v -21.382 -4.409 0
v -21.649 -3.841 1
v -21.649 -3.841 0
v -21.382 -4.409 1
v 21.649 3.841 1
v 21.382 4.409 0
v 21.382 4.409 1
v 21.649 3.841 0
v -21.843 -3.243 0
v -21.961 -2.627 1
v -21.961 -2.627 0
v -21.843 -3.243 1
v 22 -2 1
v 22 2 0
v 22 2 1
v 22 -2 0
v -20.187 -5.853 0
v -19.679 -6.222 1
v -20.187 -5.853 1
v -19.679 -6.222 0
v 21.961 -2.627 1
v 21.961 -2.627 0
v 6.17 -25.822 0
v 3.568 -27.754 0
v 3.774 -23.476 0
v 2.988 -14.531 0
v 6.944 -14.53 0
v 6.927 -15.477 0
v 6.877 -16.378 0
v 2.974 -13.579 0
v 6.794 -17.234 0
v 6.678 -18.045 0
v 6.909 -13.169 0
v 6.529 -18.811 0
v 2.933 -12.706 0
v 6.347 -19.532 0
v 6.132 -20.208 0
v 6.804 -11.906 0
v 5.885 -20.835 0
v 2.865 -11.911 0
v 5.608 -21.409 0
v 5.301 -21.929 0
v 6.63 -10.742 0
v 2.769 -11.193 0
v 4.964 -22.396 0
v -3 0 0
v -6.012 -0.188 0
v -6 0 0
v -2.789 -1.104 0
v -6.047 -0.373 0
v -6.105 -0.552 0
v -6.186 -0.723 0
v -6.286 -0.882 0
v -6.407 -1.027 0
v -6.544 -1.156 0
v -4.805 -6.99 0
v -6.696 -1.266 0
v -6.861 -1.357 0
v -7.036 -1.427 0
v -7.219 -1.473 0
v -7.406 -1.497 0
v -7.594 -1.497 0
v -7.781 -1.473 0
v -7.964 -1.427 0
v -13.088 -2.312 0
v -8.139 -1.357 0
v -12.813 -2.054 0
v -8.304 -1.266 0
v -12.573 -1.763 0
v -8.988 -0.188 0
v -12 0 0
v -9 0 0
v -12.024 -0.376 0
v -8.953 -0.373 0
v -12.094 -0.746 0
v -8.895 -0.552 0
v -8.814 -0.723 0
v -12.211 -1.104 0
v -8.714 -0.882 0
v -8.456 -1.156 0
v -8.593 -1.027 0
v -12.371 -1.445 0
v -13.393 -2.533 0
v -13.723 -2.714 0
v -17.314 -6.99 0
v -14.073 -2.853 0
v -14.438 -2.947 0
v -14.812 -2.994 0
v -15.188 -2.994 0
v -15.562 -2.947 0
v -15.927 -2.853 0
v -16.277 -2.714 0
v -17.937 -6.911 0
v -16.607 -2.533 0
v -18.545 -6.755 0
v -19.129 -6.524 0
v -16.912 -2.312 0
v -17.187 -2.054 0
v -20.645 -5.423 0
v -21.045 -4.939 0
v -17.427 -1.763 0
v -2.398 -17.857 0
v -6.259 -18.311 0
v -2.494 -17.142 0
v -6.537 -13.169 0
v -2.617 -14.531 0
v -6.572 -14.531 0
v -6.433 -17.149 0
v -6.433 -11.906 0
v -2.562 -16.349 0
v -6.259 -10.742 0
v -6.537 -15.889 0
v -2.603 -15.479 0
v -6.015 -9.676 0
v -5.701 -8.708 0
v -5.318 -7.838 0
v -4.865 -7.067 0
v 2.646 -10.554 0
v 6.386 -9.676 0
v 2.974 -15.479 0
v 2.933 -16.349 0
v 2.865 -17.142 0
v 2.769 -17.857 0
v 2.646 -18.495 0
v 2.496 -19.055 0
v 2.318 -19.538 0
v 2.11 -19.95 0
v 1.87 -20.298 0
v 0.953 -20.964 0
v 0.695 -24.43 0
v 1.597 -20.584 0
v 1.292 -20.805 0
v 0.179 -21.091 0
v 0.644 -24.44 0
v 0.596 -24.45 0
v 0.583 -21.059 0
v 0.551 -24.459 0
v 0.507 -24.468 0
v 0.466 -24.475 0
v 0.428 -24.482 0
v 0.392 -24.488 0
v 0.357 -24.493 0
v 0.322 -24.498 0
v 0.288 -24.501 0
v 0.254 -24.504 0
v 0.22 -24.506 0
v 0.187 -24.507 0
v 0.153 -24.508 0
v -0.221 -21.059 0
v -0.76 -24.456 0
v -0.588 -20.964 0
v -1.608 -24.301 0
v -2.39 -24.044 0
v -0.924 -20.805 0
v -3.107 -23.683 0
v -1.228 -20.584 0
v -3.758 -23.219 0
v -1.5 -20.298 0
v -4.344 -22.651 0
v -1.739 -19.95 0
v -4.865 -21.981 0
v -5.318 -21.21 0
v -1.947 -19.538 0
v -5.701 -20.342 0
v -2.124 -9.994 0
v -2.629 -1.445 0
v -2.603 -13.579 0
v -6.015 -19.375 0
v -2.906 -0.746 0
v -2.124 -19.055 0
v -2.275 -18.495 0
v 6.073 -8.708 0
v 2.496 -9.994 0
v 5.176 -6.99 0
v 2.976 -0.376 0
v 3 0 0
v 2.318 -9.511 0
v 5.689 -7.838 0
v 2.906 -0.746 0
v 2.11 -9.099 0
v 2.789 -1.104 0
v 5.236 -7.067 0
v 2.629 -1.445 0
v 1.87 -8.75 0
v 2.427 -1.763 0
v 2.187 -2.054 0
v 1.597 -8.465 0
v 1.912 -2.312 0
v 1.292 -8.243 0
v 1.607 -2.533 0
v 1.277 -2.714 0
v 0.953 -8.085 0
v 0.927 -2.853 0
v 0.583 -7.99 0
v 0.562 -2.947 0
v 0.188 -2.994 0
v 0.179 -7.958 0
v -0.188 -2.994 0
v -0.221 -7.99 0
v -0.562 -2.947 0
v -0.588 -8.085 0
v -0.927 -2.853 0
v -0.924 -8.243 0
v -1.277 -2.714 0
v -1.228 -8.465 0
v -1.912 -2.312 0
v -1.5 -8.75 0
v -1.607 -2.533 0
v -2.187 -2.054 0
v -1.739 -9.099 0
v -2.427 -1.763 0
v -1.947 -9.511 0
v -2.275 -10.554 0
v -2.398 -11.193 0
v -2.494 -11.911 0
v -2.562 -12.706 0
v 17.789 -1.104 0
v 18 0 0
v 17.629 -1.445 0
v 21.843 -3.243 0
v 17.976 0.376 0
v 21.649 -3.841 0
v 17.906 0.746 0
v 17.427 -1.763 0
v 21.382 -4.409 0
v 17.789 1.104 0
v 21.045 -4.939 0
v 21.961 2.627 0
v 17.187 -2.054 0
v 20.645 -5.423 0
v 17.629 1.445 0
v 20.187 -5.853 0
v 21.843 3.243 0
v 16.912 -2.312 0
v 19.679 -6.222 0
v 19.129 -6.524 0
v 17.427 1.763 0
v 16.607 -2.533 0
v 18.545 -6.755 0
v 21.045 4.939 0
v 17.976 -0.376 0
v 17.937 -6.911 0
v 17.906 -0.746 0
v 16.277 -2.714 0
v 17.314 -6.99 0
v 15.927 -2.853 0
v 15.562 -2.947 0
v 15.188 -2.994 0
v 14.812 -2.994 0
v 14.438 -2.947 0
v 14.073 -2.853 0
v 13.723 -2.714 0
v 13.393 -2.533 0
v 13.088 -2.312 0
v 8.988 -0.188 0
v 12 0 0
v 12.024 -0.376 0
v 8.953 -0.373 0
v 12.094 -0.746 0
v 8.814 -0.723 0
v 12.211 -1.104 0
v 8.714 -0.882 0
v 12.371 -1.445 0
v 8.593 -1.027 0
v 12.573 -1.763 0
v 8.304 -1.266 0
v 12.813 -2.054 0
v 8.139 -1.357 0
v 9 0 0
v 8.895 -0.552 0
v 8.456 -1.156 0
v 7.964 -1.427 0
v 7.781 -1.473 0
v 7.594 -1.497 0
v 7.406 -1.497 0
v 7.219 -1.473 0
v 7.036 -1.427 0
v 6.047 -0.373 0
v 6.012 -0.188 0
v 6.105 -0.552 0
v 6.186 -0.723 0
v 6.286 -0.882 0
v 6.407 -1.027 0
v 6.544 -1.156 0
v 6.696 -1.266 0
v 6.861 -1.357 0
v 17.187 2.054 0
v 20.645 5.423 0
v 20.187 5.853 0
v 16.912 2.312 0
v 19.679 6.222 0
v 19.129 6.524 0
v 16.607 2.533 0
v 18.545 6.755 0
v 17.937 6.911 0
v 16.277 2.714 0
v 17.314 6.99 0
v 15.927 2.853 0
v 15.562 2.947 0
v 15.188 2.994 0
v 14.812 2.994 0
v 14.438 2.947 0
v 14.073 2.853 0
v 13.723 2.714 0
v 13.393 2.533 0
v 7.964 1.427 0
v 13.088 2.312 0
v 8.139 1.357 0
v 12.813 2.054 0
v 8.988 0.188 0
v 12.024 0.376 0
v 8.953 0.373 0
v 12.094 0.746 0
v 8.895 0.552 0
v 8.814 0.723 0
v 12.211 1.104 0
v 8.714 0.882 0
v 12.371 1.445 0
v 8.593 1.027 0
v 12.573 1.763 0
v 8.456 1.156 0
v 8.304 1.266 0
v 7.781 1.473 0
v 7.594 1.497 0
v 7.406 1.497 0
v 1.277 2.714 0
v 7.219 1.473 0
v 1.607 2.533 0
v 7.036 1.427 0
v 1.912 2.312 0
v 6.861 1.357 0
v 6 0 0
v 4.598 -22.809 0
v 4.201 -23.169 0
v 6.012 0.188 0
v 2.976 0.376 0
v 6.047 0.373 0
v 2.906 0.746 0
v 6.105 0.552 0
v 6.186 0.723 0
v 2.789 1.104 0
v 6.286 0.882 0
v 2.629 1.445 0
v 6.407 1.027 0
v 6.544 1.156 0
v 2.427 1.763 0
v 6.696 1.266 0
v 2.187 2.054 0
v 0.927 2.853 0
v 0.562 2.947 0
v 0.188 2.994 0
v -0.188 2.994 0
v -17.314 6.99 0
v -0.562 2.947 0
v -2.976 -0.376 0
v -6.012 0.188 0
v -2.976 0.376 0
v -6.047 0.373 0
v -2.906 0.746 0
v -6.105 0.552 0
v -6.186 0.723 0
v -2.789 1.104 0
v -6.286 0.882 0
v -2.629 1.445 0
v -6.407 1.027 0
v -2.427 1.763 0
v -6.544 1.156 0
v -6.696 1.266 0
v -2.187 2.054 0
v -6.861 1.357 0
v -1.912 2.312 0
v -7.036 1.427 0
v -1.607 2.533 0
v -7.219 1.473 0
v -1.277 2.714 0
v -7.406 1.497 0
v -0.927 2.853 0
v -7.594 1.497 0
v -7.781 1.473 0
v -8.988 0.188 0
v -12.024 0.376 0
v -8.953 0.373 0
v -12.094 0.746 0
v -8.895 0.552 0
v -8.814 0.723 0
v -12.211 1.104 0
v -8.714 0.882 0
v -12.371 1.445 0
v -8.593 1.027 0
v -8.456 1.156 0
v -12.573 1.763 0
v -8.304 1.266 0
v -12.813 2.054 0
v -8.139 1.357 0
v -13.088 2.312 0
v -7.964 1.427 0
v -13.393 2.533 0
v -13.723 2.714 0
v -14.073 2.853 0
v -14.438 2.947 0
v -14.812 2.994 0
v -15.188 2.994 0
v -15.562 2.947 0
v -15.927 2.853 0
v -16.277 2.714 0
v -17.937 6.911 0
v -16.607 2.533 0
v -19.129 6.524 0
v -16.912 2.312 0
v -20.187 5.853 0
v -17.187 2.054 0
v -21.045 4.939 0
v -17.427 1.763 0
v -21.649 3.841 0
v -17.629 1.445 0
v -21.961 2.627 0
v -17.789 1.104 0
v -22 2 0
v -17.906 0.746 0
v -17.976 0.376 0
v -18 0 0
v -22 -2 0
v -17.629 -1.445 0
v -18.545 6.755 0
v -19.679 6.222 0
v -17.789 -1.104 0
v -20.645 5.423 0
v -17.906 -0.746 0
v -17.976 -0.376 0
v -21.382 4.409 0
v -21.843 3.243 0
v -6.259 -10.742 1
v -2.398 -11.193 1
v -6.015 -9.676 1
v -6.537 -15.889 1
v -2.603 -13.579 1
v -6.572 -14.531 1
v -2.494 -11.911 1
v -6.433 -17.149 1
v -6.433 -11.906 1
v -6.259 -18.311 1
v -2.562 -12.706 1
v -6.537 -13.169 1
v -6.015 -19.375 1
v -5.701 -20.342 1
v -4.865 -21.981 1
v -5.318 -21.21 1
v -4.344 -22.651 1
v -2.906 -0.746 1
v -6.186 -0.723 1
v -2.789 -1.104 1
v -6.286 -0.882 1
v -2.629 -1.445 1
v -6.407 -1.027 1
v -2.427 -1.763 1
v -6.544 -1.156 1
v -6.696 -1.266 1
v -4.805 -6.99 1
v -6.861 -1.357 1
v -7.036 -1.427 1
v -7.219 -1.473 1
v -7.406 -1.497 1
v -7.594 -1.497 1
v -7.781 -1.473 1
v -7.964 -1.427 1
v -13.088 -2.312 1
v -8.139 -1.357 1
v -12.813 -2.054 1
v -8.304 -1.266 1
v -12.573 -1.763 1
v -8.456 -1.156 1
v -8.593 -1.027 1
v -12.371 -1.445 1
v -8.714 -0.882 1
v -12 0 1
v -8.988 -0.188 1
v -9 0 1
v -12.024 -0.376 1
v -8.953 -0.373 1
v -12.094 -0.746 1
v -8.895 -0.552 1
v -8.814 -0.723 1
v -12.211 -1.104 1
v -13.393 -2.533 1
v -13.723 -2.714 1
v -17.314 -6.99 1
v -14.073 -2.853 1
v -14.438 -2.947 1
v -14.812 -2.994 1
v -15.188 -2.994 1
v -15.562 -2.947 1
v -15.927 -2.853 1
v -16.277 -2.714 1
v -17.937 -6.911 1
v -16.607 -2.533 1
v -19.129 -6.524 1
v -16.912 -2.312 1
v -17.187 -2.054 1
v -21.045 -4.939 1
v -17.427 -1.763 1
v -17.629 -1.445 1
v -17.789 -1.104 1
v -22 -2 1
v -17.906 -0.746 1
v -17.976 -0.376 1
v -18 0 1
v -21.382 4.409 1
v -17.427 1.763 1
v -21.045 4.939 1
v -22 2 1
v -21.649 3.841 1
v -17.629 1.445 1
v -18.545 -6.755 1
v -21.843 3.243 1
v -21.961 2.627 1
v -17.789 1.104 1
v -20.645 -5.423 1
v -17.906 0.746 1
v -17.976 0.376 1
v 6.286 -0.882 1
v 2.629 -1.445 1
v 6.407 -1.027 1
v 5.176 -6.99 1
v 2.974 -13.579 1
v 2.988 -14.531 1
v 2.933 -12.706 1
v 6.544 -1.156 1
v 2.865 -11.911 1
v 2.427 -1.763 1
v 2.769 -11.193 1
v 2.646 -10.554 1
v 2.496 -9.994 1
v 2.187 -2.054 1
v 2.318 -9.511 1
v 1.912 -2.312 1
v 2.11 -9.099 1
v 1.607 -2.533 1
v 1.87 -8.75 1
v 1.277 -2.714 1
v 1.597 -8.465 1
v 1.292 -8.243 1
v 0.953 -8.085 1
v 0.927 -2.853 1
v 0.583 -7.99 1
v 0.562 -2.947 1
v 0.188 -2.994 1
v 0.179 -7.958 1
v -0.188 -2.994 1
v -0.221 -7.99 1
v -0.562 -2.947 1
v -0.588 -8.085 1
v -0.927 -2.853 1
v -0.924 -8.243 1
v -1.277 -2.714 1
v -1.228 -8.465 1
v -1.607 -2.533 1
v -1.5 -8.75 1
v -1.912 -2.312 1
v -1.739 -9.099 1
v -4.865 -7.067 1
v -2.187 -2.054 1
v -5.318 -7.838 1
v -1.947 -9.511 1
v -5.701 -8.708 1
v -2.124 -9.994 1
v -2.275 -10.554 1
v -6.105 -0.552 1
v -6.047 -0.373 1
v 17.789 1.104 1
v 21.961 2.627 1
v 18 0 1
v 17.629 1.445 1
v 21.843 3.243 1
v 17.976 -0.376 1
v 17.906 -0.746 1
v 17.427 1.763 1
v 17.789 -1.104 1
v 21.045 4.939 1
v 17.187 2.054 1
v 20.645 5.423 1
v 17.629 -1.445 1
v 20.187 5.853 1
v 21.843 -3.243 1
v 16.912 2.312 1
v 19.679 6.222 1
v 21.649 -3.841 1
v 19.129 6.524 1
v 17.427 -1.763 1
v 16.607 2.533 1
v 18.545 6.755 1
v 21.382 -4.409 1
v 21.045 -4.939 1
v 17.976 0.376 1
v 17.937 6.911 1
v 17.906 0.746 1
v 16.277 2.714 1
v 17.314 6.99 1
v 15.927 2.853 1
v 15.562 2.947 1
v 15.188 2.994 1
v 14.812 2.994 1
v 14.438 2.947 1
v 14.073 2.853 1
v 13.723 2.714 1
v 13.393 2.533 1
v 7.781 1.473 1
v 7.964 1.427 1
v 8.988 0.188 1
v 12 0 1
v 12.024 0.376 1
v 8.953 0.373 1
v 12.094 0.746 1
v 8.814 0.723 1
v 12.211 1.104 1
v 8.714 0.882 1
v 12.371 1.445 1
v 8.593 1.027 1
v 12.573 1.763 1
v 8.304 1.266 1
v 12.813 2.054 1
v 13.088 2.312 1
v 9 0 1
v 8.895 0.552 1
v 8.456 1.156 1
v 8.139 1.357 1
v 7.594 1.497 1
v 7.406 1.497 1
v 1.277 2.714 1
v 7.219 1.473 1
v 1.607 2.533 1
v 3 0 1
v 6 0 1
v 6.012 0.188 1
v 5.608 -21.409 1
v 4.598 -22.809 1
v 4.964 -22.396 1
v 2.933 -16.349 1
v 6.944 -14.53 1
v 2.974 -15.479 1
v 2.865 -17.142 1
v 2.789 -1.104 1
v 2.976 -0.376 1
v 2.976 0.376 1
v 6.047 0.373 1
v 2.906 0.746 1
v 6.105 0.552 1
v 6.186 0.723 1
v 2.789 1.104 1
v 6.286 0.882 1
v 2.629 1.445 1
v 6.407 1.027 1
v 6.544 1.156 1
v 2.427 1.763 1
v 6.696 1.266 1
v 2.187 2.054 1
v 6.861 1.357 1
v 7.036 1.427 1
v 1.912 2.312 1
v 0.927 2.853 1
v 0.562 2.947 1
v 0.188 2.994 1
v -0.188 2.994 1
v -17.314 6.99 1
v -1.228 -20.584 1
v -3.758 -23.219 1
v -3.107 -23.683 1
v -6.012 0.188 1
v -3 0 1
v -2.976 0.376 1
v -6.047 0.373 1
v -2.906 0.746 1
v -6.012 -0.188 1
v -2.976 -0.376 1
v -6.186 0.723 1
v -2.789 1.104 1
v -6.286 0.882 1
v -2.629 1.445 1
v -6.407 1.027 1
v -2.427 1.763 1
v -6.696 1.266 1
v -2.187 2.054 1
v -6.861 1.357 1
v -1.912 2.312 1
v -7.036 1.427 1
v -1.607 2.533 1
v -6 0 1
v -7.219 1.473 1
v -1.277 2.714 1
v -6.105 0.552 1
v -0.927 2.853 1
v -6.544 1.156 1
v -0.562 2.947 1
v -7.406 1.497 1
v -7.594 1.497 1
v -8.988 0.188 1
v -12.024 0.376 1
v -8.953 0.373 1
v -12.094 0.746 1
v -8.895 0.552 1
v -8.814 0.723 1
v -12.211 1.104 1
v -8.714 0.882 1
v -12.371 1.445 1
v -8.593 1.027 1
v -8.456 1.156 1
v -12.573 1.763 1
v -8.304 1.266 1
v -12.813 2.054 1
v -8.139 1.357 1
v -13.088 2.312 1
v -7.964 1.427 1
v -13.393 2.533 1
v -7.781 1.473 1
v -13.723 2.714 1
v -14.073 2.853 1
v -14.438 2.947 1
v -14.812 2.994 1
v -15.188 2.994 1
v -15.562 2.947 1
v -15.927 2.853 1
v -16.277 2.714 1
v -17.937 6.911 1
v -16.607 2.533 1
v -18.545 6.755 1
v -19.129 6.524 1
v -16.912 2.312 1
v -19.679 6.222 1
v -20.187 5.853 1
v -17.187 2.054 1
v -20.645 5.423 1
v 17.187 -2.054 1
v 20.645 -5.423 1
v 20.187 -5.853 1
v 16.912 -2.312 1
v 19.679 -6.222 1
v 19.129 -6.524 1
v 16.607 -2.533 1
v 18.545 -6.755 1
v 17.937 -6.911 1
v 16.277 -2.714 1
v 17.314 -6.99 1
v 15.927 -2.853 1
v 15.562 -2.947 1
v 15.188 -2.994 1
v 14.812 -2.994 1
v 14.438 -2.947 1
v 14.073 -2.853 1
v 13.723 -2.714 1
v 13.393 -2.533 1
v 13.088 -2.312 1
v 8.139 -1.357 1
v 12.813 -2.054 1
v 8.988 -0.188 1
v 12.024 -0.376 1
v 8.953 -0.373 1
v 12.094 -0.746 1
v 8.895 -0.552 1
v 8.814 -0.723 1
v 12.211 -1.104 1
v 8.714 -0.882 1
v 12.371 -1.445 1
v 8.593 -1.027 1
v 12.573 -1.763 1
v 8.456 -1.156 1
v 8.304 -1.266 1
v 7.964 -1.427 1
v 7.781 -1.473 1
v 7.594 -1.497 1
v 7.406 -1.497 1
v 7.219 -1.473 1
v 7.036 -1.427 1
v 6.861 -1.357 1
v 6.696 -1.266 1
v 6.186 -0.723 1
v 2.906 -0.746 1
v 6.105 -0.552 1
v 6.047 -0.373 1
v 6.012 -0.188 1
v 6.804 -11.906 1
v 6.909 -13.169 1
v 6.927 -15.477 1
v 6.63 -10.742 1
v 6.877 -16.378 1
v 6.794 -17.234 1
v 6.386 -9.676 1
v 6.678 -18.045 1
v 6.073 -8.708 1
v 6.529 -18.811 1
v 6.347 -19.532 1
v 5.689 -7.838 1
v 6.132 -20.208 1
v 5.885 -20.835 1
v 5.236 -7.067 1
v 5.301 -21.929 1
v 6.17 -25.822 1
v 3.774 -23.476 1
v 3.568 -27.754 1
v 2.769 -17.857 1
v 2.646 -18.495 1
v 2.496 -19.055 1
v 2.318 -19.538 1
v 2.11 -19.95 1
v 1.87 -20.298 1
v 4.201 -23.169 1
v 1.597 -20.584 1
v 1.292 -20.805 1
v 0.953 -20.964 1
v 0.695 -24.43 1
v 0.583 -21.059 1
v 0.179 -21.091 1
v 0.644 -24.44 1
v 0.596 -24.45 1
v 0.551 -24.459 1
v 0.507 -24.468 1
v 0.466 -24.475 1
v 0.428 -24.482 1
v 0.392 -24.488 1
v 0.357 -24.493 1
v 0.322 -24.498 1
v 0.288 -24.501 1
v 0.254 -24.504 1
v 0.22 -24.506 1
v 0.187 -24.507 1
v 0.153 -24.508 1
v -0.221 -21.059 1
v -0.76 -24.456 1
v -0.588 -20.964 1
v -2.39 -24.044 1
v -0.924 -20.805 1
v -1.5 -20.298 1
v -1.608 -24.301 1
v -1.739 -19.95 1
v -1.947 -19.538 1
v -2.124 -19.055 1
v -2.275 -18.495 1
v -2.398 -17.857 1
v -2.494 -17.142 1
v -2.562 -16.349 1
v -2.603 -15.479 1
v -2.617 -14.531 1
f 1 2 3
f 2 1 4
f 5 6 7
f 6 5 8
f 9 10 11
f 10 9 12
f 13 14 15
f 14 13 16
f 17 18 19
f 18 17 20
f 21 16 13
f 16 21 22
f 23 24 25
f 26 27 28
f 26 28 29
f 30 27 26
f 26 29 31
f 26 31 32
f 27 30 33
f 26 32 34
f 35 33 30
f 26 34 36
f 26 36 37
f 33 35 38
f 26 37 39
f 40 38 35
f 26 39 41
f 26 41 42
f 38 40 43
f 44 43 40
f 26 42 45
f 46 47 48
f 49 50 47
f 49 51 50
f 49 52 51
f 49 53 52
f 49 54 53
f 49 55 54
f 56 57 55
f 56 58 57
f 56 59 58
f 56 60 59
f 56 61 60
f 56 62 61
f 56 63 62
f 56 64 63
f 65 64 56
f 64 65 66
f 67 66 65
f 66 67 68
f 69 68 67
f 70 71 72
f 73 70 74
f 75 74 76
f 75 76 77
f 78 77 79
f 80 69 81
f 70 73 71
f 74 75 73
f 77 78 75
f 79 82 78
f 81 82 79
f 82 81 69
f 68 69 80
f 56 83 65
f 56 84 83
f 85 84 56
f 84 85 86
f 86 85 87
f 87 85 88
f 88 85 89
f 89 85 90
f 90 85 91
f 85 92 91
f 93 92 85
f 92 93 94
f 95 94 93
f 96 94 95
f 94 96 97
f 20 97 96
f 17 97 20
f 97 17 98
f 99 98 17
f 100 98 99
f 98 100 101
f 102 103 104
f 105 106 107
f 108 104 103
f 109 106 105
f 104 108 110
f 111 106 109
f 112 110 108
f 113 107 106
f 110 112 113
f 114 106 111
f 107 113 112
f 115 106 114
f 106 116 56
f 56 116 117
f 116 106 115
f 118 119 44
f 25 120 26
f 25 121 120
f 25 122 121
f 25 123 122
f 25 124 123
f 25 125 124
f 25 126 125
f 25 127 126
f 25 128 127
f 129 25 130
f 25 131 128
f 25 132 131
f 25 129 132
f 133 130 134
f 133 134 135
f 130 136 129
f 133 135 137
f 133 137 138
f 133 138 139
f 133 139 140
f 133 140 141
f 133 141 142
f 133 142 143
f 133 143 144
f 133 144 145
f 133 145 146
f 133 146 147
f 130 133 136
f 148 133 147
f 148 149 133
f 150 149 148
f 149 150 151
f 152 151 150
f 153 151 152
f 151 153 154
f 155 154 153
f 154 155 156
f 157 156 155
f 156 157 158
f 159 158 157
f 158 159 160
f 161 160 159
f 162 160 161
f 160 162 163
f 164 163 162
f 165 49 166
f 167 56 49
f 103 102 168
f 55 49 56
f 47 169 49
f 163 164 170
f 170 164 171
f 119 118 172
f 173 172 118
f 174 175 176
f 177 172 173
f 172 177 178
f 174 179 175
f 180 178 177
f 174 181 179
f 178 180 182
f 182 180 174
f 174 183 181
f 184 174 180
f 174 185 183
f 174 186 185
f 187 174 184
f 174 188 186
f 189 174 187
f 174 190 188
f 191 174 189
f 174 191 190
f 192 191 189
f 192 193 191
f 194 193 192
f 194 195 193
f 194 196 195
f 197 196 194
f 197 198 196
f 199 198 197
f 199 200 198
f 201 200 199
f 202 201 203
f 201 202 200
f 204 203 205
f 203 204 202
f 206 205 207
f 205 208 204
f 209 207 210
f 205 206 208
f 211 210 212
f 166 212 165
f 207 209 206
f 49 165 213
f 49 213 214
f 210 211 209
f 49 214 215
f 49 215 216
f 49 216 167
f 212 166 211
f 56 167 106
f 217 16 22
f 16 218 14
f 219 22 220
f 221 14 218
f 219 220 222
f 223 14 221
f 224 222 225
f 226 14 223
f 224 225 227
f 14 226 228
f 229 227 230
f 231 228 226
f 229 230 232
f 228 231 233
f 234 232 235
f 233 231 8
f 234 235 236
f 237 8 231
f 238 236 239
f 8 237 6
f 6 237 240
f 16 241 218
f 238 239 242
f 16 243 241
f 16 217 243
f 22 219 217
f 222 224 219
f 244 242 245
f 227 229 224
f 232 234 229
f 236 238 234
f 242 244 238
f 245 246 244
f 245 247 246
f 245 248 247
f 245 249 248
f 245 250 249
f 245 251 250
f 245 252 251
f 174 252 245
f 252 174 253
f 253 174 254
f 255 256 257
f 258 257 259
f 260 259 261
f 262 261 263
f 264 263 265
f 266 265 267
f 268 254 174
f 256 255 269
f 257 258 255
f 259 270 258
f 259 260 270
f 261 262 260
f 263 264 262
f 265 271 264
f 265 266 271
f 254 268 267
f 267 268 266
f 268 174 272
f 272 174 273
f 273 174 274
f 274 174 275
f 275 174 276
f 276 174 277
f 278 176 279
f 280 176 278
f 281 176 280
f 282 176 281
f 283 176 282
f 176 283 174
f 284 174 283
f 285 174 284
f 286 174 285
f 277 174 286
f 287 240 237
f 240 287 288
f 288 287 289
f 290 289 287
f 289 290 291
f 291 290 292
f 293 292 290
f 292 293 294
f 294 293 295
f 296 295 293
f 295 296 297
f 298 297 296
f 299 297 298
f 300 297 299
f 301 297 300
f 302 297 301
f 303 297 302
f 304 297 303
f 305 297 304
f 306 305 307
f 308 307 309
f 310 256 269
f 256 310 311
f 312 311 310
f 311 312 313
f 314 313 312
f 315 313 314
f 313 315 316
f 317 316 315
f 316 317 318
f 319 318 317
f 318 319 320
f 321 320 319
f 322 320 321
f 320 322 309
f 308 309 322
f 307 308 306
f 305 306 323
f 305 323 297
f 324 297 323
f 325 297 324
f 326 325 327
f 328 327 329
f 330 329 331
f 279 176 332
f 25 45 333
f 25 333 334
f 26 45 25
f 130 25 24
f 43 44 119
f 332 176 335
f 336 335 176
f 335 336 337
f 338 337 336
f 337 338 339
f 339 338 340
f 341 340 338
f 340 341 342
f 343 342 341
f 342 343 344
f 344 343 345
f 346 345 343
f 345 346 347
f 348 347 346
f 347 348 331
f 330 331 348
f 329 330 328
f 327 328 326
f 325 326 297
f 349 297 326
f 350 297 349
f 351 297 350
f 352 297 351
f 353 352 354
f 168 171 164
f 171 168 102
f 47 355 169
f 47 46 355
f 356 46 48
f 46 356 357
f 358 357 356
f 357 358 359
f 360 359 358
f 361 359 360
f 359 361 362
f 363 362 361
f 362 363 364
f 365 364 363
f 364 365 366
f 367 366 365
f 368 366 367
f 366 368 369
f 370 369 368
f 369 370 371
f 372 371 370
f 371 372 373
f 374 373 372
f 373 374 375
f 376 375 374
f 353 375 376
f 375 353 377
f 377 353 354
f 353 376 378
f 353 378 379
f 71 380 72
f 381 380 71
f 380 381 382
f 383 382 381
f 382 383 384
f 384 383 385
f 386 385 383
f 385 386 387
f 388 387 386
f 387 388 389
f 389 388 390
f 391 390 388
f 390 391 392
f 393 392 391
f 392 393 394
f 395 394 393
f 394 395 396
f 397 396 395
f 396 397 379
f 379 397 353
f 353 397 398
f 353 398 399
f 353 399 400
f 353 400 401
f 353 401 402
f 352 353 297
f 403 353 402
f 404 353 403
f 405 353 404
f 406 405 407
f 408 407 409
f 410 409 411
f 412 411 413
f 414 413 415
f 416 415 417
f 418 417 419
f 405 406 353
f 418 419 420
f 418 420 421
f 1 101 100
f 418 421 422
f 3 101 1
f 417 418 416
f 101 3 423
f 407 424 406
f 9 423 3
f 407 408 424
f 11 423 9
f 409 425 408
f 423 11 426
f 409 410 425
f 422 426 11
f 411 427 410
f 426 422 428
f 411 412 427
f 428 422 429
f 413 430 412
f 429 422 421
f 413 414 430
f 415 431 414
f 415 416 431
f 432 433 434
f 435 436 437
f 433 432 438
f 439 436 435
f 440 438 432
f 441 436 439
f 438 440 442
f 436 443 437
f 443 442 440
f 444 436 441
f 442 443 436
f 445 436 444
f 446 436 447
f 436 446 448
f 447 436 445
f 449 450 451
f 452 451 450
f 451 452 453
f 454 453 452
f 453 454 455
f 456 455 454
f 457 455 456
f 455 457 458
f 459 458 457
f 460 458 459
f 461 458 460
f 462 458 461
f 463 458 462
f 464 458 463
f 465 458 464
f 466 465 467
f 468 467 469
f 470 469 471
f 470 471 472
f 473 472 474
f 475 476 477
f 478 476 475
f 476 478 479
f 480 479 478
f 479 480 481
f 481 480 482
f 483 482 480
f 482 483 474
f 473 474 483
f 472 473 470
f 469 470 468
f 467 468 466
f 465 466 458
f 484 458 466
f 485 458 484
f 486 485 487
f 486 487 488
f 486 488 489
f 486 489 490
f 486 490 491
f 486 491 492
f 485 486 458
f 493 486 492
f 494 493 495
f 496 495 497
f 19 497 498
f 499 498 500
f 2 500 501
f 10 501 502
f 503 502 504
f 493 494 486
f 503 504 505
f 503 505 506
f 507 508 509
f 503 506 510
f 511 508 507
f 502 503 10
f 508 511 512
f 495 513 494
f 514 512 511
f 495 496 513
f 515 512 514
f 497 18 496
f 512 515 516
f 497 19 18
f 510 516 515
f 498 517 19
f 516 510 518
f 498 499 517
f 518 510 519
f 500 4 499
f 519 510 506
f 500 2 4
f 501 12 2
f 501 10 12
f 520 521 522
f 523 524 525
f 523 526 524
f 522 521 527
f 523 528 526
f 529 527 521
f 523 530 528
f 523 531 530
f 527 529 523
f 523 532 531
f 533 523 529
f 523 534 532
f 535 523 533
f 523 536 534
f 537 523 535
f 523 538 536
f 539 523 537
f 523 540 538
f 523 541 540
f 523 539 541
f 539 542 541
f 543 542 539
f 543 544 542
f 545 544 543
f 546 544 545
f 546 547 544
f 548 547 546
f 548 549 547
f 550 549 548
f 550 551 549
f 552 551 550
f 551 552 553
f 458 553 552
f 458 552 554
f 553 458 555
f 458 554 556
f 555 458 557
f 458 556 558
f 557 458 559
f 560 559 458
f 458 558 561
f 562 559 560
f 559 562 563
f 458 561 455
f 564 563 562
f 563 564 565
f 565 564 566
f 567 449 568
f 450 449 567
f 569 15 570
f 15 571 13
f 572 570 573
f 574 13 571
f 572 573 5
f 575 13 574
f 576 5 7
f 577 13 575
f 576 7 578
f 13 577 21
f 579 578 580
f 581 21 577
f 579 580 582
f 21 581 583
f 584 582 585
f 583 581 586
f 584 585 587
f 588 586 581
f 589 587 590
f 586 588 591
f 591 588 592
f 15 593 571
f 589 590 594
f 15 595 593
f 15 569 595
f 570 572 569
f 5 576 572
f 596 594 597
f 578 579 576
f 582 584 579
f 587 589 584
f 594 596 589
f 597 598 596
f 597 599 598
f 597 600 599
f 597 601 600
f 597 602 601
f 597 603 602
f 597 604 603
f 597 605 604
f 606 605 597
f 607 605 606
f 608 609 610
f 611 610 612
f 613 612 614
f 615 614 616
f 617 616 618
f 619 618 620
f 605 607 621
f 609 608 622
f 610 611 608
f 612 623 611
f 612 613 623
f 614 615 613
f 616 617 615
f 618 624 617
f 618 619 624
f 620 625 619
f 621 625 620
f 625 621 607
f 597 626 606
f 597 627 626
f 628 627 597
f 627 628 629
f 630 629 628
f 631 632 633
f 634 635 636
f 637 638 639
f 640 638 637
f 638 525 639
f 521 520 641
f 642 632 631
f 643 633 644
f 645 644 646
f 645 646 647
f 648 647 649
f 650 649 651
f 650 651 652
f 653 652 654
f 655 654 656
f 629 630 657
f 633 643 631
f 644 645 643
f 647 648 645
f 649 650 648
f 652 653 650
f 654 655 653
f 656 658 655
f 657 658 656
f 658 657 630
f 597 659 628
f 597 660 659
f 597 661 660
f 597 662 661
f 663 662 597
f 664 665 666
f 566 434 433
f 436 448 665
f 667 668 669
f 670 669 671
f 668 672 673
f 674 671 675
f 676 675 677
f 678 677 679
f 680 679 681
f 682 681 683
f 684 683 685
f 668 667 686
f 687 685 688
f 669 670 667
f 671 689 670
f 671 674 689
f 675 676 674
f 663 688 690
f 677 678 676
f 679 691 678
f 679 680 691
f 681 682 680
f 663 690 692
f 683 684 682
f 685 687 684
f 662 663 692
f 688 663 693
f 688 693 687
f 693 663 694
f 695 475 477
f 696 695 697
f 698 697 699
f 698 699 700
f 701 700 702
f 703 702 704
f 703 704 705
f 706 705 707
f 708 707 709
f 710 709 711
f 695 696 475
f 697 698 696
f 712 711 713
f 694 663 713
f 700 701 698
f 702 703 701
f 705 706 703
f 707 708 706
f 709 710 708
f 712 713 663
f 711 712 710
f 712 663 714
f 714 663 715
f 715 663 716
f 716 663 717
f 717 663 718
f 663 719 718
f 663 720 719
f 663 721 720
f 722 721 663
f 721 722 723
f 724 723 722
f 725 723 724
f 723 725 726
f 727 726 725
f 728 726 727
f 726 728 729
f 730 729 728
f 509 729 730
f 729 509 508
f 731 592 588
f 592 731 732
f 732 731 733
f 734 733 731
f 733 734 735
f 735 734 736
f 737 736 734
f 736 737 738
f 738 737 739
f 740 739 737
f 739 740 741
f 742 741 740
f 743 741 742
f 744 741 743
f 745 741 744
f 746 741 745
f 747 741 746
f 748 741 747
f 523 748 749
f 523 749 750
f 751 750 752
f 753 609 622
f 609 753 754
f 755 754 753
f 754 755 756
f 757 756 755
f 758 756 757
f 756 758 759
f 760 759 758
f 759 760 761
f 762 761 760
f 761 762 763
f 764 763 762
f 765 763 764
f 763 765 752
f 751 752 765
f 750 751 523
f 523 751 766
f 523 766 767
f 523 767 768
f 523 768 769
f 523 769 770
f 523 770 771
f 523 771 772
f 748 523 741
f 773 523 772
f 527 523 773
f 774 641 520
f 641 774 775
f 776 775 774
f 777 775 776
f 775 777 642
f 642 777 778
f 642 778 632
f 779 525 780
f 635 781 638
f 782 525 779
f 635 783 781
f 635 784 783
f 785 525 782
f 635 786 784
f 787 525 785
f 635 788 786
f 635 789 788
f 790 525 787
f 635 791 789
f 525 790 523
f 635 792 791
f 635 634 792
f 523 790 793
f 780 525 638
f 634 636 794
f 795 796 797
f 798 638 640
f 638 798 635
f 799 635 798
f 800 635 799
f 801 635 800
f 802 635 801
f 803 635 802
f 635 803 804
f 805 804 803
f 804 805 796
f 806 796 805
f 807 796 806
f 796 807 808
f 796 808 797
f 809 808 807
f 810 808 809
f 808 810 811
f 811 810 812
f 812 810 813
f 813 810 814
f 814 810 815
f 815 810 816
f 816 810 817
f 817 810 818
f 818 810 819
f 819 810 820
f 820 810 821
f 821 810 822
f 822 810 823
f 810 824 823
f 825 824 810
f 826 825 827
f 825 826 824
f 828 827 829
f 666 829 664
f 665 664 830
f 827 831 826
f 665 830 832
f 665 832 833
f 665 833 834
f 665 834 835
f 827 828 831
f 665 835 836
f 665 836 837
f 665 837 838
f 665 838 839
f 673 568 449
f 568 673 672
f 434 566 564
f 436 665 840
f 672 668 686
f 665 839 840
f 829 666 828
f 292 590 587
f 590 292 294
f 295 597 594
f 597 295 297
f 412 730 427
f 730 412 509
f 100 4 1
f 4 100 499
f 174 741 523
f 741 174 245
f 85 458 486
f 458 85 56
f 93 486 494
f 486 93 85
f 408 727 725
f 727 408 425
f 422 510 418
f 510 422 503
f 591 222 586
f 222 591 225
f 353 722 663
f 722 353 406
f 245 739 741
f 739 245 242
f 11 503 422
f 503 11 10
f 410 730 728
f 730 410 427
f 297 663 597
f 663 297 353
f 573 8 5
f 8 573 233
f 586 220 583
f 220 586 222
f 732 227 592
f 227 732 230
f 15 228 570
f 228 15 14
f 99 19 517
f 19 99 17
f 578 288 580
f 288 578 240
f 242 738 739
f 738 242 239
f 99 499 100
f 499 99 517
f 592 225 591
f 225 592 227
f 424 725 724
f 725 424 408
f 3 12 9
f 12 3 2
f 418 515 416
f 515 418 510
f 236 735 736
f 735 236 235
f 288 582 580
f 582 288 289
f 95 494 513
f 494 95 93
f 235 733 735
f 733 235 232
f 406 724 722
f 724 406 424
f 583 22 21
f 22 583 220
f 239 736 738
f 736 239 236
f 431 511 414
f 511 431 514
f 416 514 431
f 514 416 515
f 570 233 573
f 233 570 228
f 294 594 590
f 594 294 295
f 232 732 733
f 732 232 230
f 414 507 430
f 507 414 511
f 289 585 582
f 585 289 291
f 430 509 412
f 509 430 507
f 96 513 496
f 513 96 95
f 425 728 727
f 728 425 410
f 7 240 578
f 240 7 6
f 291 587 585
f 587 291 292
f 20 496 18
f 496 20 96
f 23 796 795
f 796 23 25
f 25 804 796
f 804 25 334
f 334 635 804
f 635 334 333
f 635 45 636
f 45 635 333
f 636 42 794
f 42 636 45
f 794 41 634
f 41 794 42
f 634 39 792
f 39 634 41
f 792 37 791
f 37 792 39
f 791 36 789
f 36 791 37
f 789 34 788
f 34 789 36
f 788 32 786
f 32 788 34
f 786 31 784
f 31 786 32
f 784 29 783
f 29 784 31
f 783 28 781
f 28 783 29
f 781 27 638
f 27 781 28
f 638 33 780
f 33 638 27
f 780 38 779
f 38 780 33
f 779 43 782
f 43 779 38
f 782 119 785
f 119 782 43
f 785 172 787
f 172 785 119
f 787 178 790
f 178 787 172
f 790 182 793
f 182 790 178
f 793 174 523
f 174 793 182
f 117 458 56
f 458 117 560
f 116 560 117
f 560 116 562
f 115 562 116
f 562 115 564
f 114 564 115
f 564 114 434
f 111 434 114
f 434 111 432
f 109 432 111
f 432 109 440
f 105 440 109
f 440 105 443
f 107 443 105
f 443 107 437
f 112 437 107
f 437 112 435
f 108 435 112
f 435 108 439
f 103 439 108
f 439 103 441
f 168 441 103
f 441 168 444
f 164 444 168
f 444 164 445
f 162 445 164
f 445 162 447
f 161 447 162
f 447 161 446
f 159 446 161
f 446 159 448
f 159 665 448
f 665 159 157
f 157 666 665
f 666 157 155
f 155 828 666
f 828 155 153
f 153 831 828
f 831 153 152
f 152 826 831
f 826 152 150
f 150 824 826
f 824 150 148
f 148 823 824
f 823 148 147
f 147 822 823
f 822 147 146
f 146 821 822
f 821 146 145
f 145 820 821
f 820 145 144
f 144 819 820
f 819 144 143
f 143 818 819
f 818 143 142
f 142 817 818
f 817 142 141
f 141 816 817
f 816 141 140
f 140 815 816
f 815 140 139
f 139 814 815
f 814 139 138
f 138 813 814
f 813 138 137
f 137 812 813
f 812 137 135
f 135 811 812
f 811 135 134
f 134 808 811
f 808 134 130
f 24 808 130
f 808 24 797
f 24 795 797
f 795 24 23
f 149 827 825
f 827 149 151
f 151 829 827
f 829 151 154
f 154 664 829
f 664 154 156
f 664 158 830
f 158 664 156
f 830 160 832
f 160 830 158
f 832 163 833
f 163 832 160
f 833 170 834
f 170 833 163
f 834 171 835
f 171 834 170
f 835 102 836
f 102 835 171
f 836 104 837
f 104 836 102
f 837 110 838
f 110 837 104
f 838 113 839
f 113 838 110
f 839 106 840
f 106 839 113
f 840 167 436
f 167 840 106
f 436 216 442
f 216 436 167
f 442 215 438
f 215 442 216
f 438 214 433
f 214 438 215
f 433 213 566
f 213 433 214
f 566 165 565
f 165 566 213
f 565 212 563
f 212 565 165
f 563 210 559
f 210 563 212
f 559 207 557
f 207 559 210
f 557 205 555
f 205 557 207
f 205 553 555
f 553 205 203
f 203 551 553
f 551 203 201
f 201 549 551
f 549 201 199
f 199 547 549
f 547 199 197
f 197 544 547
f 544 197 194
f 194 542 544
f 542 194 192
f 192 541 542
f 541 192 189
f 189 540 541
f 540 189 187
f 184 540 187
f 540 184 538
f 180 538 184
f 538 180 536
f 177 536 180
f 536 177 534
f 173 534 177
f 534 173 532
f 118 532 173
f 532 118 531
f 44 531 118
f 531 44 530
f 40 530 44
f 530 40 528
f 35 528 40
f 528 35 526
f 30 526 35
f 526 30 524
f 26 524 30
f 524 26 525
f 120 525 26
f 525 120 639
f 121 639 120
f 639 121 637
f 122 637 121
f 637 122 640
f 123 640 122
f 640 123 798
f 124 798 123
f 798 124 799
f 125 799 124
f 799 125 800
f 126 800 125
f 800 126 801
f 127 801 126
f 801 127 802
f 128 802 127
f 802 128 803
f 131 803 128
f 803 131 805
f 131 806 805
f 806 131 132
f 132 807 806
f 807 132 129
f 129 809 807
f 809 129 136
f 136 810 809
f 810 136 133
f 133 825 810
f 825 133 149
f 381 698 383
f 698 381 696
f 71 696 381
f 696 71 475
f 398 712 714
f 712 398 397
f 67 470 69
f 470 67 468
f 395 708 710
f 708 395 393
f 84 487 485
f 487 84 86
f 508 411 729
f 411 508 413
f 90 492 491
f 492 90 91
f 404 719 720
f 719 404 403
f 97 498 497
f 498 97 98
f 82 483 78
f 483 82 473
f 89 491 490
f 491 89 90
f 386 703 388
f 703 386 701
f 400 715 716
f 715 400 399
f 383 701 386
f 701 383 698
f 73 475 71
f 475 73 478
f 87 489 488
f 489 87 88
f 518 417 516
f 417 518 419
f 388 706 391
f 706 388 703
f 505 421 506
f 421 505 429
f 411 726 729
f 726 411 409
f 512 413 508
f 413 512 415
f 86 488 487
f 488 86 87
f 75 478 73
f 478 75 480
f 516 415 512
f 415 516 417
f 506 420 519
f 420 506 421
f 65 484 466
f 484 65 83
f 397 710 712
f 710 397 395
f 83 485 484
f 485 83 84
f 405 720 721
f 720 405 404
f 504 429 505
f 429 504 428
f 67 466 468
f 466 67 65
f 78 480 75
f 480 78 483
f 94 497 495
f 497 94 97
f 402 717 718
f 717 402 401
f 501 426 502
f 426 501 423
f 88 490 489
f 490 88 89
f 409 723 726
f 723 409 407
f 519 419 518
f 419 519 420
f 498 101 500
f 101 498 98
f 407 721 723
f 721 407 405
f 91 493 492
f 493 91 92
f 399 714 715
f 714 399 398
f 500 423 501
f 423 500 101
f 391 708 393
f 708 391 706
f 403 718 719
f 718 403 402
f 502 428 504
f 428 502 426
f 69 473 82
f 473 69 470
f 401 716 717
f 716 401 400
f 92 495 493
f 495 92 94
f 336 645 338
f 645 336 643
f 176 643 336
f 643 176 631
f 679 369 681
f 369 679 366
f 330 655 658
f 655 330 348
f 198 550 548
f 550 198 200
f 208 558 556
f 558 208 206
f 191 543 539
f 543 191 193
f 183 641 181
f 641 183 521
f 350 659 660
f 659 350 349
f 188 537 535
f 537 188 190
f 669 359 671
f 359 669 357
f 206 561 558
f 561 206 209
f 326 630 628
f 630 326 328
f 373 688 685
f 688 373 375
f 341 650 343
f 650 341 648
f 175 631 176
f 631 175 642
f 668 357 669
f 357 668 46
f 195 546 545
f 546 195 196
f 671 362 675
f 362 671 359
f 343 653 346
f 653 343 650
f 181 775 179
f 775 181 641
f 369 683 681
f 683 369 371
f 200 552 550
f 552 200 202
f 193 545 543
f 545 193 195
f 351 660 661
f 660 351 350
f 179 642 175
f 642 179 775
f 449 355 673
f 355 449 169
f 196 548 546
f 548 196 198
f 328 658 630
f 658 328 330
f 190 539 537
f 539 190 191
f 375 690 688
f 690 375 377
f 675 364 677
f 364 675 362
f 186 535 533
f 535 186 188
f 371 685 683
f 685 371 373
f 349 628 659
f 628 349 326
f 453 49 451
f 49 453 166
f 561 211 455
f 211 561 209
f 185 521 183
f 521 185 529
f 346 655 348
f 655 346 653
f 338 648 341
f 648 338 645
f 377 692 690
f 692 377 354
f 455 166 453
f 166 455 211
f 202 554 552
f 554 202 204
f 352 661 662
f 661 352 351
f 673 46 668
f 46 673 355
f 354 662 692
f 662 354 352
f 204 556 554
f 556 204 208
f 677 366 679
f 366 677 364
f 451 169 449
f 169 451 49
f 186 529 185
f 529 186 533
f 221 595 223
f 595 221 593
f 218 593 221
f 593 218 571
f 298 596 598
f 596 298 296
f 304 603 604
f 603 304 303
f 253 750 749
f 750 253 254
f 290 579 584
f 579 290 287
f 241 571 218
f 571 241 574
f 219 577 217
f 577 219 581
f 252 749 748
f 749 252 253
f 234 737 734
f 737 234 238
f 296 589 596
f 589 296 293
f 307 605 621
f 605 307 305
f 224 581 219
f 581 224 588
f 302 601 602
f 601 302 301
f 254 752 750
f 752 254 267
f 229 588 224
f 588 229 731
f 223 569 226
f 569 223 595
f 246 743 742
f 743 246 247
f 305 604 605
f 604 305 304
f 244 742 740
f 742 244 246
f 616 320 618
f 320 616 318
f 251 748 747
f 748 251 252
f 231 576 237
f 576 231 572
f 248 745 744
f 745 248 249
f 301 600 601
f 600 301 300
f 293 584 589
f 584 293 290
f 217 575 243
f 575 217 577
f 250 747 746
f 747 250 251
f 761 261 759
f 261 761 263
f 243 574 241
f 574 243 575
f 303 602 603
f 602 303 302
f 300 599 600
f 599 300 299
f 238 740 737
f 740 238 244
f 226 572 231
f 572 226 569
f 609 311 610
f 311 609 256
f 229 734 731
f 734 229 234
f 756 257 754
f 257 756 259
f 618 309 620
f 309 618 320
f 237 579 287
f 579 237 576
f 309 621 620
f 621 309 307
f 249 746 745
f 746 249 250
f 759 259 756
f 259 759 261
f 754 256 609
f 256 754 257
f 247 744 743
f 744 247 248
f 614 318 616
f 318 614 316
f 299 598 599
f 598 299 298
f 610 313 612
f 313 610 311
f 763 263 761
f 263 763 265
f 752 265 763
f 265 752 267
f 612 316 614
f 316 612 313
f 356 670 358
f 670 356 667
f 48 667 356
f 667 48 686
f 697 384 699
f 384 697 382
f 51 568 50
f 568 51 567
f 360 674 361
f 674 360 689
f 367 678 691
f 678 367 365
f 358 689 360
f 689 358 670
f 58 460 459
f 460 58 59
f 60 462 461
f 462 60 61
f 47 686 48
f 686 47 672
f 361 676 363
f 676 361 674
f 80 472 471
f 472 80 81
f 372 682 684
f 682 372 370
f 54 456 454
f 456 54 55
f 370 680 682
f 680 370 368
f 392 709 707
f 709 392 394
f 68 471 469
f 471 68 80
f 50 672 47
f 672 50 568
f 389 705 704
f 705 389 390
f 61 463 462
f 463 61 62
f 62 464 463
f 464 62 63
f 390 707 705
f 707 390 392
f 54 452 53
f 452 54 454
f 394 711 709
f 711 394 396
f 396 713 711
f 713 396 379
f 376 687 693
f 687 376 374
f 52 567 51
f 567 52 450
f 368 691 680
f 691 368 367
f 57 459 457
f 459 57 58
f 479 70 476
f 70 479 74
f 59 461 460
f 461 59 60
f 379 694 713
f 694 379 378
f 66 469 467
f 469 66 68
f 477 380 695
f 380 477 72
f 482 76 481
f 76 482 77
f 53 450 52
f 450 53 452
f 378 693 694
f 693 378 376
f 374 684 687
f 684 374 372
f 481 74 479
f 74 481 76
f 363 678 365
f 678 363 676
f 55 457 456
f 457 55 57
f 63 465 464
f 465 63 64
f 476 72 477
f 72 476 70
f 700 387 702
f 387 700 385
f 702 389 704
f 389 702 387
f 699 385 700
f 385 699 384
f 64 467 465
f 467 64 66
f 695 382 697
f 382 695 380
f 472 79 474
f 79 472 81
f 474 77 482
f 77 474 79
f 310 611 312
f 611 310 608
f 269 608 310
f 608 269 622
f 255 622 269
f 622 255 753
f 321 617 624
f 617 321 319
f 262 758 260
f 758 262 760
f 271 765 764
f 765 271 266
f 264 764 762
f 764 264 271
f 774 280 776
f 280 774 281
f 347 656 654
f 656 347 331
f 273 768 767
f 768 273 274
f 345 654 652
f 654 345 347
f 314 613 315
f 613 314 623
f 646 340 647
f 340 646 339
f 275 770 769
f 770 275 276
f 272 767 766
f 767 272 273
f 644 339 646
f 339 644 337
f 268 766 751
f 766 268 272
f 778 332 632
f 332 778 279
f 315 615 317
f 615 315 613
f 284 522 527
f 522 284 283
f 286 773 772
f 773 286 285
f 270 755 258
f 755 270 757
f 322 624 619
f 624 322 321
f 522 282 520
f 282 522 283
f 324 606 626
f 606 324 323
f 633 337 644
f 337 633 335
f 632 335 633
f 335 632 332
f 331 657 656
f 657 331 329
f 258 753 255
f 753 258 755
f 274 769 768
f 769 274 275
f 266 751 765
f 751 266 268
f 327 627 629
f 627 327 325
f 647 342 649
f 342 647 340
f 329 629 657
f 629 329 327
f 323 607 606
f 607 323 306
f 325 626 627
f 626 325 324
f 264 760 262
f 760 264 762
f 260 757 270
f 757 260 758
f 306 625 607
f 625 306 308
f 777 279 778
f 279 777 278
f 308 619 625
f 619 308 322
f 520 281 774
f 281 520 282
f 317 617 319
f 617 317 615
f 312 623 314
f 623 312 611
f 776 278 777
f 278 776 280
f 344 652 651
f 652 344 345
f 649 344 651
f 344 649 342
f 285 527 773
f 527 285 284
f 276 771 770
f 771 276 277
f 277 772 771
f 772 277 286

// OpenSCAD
$fn = 50;


difference() {
	union() {
		*color(alpha = 1.0000000000, c = "gray") {
			translate(v = [0, 14, 0]) {
				linear_extrude(height = 1) {
					text(font = "Arial:style=Bold", halign = "center", size = 4.5000000000, text = "COMMENT description oobb_plate_shape_p_type_1_depth_3_width_1_thickness_q_extra_oobb_size", valign = "center");
				}
			}
		}
		hull() {
			translate(v = [-17.0000000000, 2.0000000000, 0]) {
				cylinder(h = 1, r = 5);
			}
			translate(v = [17.0000000000, 2.0000000000, 0]) {
				cylinder(h = 1, r = 5);
			}
			translate(v = [-17.0000000000, -2.0000000000, 0]) {
				cylinder(h = 1, r = 5);
			}
			translate(v = [17.0000000000, -2.0000000000, 0]) {
				cylinder(h = 1, r = 5);
			}
		}
		translate(v = [0, -5, 0]) {
			linear_extrude(height = 1) {
				text(font = "DejaVu Sans Mono:style=Bold", halign = "center", size = 19.0000000000, text = "Q", valign = "top");
			}
		}
	}
	union() {
		*color(alpha = 1.0000000000, c = "gray") {
			translate(v = [0, 14, 0]) {
				linear_extrude(height = 1) {
					text(font = "Arial:style=Bold", halign = "center", size = 4.5000000000, text = "COMMENT description oobb_holes_shape_n_type_3_width_1_thickness_q_extra_oobb_size_1_height_'all'_holes_true_both_holes", valign = "center");
				}
			}
		}
		translate(v = [-15.0000000000, 0.0000000000, 0]) {
			translate(v = [0, 0, -50]) {
				cylinder(h = 100, r = 3.0000000000);
			}
		}
		translate(v = [0, 0, -50]) {
			cylinder(h = 100, r = 3.0000000000);
		}
		translate(v = [15.0000000000, 0.0000000000, 0]) {
			translate(v = [0, 0, -50]) {
				cylinder(h = 100, r = 3.0000000000);
			}
		}
		translate(v = [-15.0000000000, 0.0000000000, 0]) {
			translate(v = [0, 0, -50]) {
				cylinder(h = 100, r = 1.5000000000);
			}
		}
		translate(v = [-7.5000000000, 0.0000000000, 0]) {
			translate(v = [0, 0, -50]) {
				cylinder(h = 100, r = 1.5000000000);
			}
		}
		translate(v = [0, 0, -50]) {
			cylinder(h = 100, r = 1.5000000000);
		}
		translate(v = [7.5000000000, 0.0000000000, 0]) {
			translate(v = [0, 0, -50]) {
				cylinder(h = 100, r = 1.5000000000);
			}
		}
		translate(v = [15.0000000000, 0.0000000000, 0]) {
			translate(v = [0, 0, -50]) {
				cylinder(h = 100, r = 1.5000000000);
			}
		}
	}
}
